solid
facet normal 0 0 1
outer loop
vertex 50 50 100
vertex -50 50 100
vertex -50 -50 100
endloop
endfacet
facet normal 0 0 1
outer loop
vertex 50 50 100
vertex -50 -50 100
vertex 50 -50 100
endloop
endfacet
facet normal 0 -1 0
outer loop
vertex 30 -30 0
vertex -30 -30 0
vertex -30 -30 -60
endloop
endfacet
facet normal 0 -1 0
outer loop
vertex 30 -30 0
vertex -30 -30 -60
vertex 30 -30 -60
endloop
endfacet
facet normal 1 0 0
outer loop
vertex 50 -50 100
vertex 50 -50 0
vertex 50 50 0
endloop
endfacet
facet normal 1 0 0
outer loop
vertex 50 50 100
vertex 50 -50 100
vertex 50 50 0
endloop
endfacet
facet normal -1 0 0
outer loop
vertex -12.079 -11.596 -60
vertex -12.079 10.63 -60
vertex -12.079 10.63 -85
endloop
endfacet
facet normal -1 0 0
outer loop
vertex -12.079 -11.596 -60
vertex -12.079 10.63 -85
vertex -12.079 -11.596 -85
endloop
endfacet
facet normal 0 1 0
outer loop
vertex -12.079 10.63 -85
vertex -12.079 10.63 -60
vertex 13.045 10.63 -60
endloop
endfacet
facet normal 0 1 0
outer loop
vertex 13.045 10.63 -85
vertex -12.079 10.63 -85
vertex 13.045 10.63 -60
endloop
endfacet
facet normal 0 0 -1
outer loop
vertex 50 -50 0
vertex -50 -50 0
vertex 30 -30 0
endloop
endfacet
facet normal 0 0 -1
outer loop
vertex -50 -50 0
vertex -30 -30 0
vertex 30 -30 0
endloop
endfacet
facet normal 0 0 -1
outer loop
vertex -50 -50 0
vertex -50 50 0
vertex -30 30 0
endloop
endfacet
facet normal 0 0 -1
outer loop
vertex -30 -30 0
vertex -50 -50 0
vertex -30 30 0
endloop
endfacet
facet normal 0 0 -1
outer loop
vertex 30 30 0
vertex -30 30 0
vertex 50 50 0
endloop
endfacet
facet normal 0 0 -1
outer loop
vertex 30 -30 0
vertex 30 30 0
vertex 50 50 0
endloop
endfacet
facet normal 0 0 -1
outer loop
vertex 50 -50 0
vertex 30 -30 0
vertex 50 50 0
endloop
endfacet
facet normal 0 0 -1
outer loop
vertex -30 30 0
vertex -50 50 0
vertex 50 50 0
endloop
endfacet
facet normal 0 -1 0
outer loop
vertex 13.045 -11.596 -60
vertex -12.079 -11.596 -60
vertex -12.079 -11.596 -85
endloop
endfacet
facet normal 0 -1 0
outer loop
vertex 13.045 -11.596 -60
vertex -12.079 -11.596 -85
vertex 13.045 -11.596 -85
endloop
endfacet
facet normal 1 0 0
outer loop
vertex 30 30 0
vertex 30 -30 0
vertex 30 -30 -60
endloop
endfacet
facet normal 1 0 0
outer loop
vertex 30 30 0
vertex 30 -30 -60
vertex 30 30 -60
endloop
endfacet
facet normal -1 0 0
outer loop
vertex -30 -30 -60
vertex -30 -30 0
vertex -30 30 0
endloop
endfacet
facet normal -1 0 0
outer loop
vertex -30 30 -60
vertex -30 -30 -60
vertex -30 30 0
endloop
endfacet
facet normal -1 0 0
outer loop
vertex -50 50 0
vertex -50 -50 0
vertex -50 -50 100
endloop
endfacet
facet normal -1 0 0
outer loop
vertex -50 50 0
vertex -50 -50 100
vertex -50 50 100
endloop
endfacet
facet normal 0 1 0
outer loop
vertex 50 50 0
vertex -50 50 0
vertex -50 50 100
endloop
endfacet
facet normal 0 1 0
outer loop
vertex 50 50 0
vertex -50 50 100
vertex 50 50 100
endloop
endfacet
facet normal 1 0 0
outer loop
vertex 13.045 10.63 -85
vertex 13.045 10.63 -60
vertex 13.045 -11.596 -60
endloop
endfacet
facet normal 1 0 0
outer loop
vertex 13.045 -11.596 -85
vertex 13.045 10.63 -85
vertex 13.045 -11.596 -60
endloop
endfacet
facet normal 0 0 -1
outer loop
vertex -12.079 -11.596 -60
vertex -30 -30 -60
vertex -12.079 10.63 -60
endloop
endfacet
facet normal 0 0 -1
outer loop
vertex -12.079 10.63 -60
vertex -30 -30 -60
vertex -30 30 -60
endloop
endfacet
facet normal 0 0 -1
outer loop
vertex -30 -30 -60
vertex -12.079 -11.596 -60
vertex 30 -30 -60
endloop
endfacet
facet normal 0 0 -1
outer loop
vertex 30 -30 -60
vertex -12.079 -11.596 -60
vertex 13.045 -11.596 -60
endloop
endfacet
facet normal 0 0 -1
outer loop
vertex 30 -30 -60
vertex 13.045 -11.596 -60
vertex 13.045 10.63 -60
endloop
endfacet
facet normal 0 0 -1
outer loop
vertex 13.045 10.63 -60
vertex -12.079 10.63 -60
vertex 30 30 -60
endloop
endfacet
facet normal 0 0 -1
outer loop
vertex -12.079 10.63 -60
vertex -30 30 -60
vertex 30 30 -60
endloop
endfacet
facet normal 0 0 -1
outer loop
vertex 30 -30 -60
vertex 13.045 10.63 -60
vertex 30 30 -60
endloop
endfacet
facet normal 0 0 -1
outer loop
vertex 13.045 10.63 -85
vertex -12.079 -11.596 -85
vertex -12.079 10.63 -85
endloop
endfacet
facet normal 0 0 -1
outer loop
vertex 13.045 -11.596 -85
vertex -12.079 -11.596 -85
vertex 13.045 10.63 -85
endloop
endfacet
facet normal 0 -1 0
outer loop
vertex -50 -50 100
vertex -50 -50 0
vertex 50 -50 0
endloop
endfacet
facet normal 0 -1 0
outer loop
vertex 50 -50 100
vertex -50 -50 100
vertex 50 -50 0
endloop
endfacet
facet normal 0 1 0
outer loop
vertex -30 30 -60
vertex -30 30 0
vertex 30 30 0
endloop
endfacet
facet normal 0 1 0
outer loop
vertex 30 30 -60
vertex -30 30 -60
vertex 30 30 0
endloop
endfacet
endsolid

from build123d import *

# Parameters (mm, degrees)
F0_W      = 100
F0_H      = 100
F1_DEPTH  = 100
F2_W      = 21.2592259049
F2_H      = 13.5286012664
F3_DEPTH  = 20
F4_W      = 60
F4_H      = 60
F5_DEPTH  = 60
F7_W      = 35
F7_H      = 27.0690375748
F6_W      = 60
F6_H      = 60
F9_DEPTH  = 100
F10_W     = 25.1245461404
F10_H     = 22.2255568951
F12_DEPTH = 25


# Not quite as in the source:
# - a feature of the source that left no trace in its solid (it failed there, or was rolled back) is left out


with BuildPart() as f1:
    # F0 (on Top) → F1 (new body)
    with BuildSketch(Plane.XY):
        Rectangle(F0_W, F0_H)
    extrude(amount=F1_DEPTH)

    # F2 (on Top) → F3 (join)
    with BuildSketch(Plane.XY):
        Rectangle(F2_W, F2_H)
    extrude(amount=-F3_DEPTH)

    # F4 (on Top) → F5 (join)
    with BuildSketch(Plane.XY):
        Rectangle(F4_W, F4_H)
    extrude(amount=-F5_DEPTH)

    # F7 (on face) + F6 (on face) → F9 (join)
    with BuildSketch(Plane(origin=(0, 0, -60), x_dir=(1, 0, 0), z_dir=(0, 0, -1))):
        Rectangle(F7_W, F7_H)
    with BuildSketch(Plane(origin=(0, 0, -60), x_dir=(1, 0, 0), z_dir=(0, 0, -1))):
        Rectangle(F6_W, F6_H)
    extrude(amount=-F9_DEPTH)

    # F10 (on face) → F12 (join)
    with BuildSketch(Plane(origin=(0, 0, -60), x_dir=(1, 0, 0), z_dir=(0, 0, -1))):
        with Locations((0.4831599072, 0.4831608385)):
            Rectangle(F10_W, F10_H)
    extrude(amount=F12_DEPTH)


solid = f1.part
